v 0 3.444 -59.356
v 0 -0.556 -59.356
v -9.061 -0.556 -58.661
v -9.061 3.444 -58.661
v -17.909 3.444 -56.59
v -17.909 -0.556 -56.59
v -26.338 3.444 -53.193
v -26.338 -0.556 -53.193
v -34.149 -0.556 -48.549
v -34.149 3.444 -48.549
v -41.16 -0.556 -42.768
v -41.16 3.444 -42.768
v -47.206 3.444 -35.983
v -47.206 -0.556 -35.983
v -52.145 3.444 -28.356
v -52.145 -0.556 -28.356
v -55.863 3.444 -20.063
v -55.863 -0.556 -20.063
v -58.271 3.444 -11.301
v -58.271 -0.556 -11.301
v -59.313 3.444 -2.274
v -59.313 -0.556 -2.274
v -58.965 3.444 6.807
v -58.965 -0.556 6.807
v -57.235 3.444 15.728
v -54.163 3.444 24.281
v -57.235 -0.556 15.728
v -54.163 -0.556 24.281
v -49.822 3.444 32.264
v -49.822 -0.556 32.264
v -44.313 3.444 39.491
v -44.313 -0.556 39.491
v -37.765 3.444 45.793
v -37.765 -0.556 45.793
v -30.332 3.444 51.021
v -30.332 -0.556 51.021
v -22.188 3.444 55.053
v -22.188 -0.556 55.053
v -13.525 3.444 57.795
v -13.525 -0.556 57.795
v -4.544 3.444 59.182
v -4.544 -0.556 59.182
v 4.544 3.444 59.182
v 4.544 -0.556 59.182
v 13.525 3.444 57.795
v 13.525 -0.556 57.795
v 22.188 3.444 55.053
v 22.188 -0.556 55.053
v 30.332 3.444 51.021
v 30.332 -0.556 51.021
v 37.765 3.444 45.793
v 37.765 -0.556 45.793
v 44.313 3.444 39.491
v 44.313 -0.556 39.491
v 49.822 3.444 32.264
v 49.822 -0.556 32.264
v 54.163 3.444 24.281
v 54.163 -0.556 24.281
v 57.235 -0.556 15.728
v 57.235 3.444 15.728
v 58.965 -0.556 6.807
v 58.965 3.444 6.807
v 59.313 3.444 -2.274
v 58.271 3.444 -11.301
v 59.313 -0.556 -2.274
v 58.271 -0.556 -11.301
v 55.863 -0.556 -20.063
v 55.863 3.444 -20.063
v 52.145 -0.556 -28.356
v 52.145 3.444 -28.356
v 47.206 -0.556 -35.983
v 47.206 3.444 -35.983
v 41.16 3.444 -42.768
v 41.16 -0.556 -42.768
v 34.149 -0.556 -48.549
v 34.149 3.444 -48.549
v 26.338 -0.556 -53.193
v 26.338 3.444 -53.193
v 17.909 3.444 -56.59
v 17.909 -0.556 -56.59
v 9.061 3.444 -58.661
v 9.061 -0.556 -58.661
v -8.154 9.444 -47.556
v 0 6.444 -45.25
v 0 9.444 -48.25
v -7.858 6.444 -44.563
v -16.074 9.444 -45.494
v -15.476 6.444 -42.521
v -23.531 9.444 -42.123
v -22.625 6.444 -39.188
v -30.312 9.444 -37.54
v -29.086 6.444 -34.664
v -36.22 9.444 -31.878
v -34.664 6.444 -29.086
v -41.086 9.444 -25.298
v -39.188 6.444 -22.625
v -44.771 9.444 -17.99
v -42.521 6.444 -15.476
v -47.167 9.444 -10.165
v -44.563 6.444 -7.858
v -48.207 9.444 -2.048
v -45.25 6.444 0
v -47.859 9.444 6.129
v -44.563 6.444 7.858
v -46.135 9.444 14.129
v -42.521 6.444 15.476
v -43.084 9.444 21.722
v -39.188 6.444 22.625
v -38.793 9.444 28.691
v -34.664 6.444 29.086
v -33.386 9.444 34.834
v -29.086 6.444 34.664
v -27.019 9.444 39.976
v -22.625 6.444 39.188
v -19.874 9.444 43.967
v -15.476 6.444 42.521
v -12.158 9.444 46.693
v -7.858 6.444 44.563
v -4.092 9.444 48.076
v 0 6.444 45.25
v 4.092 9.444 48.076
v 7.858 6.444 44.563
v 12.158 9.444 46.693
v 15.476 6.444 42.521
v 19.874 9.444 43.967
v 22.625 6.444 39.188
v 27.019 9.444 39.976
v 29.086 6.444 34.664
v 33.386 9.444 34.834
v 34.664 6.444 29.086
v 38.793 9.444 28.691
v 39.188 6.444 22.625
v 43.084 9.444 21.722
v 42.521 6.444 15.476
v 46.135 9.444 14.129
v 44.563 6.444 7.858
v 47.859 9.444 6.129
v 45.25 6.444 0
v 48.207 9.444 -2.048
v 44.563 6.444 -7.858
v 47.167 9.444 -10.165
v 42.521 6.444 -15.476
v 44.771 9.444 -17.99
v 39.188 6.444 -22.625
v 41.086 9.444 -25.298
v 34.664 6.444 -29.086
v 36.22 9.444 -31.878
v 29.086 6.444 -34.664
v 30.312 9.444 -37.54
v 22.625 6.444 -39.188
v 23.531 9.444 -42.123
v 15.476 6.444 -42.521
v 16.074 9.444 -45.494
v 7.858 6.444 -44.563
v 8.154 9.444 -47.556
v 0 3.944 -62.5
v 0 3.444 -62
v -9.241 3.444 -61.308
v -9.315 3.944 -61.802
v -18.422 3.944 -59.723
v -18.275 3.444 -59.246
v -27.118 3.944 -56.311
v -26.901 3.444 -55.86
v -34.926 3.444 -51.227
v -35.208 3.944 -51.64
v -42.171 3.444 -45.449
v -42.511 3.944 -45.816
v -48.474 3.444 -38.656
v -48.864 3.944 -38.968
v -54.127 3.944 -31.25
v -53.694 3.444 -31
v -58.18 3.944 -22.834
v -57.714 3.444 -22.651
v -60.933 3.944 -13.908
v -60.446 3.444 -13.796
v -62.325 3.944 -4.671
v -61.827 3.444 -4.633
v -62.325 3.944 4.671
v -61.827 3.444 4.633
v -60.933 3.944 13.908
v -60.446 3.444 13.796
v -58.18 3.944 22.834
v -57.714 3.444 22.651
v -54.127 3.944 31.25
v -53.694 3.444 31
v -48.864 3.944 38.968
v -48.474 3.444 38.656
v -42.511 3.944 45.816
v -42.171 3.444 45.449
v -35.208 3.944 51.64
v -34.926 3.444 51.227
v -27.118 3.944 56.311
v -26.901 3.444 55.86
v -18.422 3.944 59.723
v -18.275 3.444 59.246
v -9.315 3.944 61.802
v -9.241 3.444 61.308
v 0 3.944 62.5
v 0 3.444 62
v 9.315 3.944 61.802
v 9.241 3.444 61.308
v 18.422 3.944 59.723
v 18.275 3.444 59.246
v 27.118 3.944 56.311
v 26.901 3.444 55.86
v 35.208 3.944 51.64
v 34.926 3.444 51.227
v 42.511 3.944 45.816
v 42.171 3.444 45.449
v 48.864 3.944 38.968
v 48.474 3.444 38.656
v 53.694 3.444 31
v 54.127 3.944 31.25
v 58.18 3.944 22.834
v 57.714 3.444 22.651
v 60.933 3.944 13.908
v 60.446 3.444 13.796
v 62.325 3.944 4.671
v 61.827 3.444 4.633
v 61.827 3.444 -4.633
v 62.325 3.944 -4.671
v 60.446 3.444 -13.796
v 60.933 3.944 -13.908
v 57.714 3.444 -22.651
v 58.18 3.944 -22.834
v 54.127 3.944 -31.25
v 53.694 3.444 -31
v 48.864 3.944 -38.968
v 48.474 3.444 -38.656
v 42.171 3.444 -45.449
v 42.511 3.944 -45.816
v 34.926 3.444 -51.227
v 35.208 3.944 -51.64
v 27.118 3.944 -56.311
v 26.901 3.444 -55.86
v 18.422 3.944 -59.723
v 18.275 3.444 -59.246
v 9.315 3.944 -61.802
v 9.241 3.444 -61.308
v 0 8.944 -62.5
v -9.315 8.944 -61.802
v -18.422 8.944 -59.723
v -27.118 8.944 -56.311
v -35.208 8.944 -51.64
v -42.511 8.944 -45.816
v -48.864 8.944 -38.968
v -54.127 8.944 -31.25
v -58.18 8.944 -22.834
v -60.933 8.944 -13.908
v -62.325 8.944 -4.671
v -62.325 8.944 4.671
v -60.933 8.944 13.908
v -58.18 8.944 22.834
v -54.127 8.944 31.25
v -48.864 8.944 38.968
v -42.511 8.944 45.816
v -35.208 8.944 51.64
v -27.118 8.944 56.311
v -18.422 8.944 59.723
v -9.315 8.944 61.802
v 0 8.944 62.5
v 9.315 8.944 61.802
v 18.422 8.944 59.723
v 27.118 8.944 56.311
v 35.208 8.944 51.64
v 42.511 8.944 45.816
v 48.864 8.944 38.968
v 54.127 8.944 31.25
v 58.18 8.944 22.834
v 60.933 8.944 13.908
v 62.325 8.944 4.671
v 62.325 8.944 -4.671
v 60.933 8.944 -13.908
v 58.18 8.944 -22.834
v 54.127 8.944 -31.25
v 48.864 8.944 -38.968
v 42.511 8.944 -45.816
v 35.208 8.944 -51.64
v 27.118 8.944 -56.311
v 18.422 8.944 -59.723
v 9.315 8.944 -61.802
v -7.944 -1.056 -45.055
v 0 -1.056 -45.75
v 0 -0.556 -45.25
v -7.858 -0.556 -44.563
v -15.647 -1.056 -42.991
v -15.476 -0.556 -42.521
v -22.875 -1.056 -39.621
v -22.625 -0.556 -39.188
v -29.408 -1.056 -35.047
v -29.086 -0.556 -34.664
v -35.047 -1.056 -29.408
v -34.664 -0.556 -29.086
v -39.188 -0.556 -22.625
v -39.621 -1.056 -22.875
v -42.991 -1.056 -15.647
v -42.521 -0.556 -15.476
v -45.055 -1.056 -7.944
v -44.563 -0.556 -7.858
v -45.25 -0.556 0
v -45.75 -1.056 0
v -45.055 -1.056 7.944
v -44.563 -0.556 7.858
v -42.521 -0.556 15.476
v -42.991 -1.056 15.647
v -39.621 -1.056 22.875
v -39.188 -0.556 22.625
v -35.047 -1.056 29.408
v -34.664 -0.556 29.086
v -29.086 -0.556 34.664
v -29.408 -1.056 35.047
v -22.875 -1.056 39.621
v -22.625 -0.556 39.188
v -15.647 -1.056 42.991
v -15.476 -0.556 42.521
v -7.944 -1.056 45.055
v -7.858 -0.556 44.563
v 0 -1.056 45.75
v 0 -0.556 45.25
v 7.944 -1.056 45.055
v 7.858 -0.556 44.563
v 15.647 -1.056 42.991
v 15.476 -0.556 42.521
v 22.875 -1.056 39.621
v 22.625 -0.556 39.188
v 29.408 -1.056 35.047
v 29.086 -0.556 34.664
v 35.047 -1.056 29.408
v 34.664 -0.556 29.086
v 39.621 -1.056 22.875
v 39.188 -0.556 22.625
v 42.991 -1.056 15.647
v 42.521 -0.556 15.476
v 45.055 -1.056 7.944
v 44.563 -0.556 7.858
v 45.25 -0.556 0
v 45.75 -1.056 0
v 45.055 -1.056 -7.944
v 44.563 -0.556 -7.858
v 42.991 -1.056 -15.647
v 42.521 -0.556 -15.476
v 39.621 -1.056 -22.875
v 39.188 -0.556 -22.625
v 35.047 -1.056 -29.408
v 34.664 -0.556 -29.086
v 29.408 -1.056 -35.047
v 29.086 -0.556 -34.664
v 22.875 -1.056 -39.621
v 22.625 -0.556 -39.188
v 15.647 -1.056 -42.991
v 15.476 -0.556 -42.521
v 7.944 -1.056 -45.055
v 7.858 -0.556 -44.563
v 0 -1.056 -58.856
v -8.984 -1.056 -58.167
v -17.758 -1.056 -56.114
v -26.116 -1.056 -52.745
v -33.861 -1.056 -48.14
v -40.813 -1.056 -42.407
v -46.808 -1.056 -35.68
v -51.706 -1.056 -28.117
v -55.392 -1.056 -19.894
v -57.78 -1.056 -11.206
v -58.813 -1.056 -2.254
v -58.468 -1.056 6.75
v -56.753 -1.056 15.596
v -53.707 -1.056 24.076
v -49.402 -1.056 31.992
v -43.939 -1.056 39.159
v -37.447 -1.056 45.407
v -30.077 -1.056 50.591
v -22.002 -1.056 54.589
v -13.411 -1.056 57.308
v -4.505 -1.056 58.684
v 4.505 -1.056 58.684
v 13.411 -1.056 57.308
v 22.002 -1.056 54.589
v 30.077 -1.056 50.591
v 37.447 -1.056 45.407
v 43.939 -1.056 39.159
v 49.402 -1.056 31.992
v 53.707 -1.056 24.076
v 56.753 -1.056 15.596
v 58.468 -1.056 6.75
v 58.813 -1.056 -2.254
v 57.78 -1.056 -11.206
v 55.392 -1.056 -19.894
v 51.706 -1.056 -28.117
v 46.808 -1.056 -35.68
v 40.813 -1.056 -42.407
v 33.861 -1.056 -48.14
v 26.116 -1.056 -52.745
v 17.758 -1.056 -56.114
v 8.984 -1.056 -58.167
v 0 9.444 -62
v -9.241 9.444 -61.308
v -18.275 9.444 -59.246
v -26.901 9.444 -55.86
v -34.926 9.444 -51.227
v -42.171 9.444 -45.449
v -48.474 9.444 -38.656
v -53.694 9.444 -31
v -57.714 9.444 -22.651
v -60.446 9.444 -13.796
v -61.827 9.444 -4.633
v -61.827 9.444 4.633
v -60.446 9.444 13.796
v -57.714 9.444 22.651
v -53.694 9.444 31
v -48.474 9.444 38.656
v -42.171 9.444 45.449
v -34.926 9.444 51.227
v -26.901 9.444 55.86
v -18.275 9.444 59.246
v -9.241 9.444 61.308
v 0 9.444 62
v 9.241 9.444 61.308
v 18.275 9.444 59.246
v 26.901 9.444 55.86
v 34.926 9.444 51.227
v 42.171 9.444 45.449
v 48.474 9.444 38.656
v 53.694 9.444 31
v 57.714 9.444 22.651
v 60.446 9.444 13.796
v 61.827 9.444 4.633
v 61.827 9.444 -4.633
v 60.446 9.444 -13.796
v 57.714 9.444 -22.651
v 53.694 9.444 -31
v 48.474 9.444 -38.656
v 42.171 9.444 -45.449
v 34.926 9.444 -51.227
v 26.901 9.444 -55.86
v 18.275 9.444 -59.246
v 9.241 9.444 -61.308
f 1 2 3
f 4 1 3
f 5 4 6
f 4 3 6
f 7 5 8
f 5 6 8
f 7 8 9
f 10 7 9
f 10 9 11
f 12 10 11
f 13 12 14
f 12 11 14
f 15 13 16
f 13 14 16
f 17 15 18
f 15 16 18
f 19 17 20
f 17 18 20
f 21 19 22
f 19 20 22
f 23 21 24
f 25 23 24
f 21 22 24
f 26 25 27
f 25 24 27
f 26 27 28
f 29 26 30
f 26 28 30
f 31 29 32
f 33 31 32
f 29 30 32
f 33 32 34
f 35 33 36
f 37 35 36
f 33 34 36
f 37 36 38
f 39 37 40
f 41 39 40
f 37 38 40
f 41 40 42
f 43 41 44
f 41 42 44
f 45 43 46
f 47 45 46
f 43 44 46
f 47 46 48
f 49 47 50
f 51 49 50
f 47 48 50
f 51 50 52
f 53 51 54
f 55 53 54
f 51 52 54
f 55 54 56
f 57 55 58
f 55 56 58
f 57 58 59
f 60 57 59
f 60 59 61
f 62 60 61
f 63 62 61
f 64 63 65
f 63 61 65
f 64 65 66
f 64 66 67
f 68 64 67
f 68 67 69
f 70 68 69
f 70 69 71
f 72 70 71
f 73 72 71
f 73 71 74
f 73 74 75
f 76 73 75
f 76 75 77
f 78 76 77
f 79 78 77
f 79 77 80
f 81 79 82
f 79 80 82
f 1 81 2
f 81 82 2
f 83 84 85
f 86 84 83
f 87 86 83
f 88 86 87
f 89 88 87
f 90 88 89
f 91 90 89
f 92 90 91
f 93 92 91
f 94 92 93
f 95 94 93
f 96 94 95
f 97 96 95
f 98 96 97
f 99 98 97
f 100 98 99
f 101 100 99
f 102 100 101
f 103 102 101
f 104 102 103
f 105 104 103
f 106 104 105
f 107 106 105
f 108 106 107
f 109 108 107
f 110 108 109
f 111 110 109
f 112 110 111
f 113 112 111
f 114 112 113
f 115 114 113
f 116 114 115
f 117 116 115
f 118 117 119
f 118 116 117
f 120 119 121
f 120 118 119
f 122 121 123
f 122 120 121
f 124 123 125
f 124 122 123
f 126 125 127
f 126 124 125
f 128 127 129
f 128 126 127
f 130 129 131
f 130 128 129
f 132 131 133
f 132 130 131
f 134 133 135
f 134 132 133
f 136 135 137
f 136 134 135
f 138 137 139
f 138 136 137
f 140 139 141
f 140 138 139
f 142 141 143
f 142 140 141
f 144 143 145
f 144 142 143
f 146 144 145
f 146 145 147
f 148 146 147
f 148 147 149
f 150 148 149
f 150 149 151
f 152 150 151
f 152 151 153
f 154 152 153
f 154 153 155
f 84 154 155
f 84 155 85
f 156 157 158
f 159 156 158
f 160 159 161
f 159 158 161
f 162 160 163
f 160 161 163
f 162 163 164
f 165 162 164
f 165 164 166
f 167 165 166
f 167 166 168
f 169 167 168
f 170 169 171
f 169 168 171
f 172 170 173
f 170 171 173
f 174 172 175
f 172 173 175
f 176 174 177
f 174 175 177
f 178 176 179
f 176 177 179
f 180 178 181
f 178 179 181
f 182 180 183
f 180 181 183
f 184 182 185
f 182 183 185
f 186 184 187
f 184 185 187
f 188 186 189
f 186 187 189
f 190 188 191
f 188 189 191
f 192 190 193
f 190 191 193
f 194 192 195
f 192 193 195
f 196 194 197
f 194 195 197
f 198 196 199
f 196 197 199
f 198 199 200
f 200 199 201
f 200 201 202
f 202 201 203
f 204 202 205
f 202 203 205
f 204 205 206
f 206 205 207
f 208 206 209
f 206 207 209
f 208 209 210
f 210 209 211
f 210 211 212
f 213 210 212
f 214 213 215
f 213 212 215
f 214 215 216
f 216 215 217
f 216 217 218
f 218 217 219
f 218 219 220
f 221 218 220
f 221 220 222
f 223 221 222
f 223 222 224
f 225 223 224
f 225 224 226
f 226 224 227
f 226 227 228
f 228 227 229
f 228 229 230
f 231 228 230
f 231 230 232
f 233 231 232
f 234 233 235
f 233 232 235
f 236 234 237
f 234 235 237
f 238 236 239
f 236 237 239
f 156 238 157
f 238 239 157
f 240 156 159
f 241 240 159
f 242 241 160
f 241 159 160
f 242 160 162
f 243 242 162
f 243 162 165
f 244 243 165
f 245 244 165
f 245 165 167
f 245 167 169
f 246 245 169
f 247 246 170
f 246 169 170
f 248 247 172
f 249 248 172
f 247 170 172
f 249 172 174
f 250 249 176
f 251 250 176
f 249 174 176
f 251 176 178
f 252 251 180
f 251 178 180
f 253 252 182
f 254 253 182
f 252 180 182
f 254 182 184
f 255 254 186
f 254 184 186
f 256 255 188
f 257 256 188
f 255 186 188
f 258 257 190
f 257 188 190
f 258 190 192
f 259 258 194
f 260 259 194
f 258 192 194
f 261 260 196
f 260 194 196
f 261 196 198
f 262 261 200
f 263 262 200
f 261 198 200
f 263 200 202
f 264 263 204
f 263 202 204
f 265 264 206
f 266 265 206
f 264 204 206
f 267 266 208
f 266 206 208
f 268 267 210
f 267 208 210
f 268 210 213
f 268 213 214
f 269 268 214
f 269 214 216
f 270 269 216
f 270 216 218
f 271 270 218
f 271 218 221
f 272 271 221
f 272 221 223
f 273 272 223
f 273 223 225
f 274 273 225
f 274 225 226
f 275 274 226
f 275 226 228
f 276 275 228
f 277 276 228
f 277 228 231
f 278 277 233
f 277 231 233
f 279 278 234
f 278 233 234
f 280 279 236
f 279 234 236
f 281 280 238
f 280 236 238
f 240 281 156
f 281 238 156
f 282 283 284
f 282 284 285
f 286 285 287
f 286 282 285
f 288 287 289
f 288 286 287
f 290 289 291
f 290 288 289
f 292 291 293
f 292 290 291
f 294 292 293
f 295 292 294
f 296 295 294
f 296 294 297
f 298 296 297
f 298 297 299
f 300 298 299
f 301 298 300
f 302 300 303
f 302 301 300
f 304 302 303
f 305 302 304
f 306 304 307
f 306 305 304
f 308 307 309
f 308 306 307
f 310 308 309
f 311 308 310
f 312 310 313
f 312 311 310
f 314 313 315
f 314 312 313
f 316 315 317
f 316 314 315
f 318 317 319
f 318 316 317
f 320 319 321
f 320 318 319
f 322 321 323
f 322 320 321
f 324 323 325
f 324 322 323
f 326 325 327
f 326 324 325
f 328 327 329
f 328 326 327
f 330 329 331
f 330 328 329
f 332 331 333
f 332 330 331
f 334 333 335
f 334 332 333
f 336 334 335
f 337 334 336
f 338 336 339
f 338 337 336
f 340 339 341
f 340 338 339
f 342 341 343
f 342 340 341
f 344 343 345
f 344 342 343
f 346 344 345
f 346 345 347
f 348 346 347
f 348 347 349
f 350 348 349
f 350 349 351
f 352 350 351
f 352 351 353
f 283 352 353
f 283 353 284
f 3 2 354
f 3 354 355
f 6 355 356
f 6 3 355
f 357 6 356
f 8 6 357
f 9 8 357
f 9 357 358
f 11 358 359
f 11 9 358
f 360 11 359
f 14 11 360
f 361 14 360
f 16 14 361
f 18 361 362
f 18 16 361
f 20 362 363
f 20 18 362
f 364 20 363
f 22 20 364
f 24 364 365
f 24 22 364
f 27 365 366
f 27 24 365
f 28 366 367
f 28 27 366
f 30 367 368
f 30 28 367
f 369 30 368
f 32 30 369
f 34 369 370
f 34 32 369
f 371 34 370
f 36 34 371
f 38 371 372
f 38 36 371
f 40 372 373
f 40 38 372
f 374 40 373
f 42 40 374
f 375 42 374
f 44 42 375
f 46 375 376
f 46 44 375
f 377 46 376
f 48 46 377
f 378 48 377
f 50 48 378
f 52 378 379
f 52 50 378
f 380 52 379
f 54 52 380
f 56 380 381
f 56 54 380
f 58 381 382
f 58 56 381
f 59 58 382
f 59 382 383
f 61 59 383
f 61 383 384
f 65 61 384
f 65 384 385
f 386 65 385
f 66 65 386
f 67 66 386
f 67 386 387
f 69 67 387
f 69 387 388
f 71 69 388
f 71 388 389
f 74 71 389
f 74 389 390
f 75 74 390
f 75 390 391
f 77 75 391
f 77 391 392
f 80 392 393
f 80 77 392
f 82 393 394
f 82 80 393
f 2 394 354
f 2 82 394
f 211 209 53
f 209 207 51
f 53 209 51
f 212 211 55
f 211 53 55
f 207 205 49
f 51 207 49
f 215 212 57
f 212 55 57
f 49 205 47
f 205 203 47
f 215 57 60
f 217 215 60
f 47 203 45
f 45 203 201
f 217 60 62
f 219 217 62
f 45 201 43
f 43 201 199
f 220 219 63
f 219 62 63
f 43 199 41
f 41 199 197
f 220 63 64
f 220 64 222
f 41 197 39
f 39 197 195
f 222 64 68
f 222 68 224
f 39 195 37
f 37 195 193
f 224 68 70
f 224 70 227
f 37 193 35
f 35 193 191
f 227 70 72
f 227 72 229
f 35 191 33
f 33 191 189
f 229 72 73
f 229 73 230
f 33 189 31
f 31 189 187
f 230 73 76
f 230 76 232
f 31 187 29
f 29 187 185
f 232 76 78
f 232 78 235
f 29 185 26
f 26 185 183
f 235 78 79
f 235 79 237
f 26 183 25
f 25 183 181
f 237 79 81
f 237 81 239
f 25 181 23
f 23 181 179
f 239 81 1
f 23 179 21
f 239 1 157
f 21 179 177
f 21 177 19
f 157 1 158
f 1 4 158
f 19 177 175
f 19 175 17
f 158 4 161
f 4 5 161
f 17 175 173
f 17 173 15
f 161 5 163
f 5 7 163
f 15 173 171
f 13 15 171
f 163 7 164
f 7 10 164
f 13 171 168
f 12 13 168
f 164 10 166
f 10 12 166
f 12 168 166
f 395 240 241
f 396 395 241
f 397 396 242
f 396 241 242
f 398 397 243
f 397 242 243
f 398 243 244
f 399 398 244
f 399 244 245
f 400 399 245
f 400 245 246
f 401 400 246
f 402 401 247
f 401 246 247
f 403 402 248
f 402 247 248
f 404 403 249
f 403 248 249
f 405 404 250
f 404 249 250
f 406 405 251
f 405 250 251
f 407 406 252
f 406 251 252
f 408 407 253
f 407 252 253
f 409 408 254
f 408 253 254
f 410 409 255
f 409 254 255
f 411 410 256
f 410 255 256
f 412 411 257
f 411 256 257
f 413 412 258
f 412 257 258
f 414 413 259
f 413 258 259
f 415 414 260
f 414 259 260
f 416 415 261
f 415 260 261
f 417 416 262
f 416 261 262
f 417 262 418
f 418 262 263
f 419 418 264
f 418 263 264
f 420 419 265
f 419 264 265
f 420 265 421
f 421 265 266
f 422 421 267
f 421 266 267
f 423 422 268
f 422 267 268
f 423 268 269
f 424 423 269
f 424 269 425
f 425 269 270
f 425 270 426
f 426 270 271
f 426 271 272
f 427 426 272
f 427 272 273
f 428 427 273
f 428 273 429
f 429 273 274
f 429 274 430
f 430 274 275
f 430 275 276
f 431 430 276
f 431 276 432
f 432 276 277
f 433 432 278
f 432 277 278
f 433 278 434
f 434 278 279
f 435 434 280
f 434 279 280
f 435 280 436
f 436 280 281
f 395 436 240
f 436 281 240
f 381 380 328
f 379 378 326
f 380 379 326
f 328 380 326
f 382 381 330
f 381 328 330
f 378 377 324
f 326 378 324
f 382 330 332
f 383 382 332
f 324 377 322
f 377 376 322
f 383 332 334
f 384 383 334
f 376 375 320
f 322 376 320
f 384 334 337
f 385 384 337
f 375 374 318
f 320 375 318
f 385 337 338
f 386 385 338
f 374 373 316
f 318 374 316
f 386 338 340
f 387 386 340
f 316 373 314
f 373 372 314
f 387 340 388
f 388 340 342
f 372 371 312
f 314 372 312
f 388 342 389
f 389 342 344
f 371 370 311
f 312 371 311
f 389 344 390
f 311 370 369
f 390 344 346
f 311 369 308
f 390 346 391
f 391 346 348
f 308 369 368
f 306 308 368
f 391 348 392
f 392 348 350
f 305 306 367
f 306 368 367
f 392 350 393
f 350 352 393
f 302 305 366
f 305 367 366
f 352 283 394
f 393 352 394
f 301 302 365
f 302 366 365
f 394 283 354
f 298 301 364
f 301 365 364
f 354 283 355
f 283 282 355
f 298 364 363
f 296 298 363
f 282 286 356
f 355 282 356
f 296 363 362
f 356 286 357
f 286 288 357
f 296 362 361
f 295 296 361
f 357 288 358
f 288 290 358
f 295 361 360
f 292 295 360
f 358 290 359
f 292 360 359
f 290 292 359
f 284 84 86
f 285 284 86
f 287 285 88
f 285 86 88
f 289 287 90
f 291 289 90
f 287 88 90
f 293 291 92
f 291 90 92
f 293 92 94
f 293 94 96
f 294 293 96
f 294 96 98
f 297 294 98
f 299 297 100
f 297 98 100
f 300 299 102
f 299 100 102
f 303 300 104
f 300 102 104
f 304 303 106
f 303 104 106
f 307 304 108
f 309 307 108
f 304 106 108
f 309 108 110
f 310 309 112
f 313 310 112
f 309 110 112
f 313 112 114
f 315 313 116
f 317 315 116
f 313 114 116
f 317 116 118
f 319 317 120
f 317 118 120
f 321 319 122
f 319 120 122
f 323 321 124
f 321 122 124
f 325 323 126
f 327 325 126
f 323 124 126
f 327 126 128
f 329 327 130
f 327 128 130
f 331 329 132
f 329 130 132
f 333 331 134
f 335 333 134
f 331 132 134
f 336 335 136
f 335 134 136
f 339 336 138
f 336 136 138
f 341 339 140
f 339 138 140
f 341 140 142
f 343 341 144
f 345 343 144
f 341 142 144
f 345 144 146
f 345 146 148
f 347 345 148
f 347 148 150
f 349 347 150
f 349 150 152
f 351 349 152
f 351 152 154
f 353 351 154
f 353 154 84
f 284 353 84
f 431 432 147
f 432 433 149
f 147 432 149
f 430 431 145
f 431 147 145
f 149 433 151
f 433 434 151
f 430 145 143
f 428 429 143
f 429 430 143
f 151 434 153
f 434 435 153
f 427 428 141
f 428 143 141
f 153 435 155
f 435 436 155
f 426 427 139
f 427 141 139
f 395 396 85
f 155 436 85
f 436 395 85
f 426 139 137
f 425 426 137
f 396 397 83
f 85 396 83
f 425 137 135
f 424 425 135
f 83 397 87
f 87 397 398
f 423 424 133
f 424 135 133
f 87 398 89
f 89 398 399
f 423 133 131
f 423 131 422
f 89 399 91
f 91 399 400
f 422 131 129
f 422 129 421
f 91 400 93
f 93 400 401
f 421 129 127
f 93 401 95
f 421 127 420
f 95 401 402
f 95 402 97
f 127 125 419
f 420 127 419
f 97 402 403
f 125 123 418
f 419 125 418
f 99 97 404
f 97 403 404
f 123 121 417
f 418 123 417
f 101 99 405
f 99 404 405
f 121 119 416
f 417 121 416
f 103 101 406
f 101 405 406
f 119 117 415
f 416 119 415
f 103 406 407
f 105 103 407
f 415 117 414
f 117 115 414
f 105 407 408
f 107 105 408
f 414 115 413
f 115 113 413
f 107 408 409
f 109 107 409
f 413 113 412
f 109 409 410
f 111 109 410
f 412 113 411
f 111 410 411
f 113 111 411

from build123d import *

# Parameters (mm, degrees)
CHANFRO1_SIZE = 3
CHANFRO2_SIZE = 0.5


with BuildPart() as part:
    # Esboço1 → Revolução1 (revolve)
    with BuildSketch(Plane.XY, mode=Mode.PRIVATE) as revolu_o1_sk:
        Polygon((45.25, 9.444130676), (62.5, 9.444130676), (62.5, 3.444130676), (59.356423034, 3.444130676), (59.356423034, -1.055869324), (45.25, -1.055869324), align=None)
    revolve(revolu_o1_sk.sketch.rotate(Axis((0, -46.025193798, 0), (0, 1, 0)), 90), axis=Axis((0, -46.025193798, 0), (0, 1, 0)))

    # Chanfro1
    chanfro1_edges = [part.edges().sort_by_distance(p)[0] for p in [
        (0, 9.444130676, 45.25),
    ]]
    chamfer(chanfro1_edges, length=CHANFRO1_SIZE)

    # Chanfro2
    chanfro2_edges = [part.edges().sort_by_distance(p)[0] for p in [
        (0, -1.055869324, 45.25),
        (0, -1.055869324, 59.356423034),
        (0, 3.444130676, 62.5),
        (0, 9.444130676, 62.5),
    ]]
    chamfer(chanfro2_edges, length=CHANFRO2_SIZE)


solid = part.part
